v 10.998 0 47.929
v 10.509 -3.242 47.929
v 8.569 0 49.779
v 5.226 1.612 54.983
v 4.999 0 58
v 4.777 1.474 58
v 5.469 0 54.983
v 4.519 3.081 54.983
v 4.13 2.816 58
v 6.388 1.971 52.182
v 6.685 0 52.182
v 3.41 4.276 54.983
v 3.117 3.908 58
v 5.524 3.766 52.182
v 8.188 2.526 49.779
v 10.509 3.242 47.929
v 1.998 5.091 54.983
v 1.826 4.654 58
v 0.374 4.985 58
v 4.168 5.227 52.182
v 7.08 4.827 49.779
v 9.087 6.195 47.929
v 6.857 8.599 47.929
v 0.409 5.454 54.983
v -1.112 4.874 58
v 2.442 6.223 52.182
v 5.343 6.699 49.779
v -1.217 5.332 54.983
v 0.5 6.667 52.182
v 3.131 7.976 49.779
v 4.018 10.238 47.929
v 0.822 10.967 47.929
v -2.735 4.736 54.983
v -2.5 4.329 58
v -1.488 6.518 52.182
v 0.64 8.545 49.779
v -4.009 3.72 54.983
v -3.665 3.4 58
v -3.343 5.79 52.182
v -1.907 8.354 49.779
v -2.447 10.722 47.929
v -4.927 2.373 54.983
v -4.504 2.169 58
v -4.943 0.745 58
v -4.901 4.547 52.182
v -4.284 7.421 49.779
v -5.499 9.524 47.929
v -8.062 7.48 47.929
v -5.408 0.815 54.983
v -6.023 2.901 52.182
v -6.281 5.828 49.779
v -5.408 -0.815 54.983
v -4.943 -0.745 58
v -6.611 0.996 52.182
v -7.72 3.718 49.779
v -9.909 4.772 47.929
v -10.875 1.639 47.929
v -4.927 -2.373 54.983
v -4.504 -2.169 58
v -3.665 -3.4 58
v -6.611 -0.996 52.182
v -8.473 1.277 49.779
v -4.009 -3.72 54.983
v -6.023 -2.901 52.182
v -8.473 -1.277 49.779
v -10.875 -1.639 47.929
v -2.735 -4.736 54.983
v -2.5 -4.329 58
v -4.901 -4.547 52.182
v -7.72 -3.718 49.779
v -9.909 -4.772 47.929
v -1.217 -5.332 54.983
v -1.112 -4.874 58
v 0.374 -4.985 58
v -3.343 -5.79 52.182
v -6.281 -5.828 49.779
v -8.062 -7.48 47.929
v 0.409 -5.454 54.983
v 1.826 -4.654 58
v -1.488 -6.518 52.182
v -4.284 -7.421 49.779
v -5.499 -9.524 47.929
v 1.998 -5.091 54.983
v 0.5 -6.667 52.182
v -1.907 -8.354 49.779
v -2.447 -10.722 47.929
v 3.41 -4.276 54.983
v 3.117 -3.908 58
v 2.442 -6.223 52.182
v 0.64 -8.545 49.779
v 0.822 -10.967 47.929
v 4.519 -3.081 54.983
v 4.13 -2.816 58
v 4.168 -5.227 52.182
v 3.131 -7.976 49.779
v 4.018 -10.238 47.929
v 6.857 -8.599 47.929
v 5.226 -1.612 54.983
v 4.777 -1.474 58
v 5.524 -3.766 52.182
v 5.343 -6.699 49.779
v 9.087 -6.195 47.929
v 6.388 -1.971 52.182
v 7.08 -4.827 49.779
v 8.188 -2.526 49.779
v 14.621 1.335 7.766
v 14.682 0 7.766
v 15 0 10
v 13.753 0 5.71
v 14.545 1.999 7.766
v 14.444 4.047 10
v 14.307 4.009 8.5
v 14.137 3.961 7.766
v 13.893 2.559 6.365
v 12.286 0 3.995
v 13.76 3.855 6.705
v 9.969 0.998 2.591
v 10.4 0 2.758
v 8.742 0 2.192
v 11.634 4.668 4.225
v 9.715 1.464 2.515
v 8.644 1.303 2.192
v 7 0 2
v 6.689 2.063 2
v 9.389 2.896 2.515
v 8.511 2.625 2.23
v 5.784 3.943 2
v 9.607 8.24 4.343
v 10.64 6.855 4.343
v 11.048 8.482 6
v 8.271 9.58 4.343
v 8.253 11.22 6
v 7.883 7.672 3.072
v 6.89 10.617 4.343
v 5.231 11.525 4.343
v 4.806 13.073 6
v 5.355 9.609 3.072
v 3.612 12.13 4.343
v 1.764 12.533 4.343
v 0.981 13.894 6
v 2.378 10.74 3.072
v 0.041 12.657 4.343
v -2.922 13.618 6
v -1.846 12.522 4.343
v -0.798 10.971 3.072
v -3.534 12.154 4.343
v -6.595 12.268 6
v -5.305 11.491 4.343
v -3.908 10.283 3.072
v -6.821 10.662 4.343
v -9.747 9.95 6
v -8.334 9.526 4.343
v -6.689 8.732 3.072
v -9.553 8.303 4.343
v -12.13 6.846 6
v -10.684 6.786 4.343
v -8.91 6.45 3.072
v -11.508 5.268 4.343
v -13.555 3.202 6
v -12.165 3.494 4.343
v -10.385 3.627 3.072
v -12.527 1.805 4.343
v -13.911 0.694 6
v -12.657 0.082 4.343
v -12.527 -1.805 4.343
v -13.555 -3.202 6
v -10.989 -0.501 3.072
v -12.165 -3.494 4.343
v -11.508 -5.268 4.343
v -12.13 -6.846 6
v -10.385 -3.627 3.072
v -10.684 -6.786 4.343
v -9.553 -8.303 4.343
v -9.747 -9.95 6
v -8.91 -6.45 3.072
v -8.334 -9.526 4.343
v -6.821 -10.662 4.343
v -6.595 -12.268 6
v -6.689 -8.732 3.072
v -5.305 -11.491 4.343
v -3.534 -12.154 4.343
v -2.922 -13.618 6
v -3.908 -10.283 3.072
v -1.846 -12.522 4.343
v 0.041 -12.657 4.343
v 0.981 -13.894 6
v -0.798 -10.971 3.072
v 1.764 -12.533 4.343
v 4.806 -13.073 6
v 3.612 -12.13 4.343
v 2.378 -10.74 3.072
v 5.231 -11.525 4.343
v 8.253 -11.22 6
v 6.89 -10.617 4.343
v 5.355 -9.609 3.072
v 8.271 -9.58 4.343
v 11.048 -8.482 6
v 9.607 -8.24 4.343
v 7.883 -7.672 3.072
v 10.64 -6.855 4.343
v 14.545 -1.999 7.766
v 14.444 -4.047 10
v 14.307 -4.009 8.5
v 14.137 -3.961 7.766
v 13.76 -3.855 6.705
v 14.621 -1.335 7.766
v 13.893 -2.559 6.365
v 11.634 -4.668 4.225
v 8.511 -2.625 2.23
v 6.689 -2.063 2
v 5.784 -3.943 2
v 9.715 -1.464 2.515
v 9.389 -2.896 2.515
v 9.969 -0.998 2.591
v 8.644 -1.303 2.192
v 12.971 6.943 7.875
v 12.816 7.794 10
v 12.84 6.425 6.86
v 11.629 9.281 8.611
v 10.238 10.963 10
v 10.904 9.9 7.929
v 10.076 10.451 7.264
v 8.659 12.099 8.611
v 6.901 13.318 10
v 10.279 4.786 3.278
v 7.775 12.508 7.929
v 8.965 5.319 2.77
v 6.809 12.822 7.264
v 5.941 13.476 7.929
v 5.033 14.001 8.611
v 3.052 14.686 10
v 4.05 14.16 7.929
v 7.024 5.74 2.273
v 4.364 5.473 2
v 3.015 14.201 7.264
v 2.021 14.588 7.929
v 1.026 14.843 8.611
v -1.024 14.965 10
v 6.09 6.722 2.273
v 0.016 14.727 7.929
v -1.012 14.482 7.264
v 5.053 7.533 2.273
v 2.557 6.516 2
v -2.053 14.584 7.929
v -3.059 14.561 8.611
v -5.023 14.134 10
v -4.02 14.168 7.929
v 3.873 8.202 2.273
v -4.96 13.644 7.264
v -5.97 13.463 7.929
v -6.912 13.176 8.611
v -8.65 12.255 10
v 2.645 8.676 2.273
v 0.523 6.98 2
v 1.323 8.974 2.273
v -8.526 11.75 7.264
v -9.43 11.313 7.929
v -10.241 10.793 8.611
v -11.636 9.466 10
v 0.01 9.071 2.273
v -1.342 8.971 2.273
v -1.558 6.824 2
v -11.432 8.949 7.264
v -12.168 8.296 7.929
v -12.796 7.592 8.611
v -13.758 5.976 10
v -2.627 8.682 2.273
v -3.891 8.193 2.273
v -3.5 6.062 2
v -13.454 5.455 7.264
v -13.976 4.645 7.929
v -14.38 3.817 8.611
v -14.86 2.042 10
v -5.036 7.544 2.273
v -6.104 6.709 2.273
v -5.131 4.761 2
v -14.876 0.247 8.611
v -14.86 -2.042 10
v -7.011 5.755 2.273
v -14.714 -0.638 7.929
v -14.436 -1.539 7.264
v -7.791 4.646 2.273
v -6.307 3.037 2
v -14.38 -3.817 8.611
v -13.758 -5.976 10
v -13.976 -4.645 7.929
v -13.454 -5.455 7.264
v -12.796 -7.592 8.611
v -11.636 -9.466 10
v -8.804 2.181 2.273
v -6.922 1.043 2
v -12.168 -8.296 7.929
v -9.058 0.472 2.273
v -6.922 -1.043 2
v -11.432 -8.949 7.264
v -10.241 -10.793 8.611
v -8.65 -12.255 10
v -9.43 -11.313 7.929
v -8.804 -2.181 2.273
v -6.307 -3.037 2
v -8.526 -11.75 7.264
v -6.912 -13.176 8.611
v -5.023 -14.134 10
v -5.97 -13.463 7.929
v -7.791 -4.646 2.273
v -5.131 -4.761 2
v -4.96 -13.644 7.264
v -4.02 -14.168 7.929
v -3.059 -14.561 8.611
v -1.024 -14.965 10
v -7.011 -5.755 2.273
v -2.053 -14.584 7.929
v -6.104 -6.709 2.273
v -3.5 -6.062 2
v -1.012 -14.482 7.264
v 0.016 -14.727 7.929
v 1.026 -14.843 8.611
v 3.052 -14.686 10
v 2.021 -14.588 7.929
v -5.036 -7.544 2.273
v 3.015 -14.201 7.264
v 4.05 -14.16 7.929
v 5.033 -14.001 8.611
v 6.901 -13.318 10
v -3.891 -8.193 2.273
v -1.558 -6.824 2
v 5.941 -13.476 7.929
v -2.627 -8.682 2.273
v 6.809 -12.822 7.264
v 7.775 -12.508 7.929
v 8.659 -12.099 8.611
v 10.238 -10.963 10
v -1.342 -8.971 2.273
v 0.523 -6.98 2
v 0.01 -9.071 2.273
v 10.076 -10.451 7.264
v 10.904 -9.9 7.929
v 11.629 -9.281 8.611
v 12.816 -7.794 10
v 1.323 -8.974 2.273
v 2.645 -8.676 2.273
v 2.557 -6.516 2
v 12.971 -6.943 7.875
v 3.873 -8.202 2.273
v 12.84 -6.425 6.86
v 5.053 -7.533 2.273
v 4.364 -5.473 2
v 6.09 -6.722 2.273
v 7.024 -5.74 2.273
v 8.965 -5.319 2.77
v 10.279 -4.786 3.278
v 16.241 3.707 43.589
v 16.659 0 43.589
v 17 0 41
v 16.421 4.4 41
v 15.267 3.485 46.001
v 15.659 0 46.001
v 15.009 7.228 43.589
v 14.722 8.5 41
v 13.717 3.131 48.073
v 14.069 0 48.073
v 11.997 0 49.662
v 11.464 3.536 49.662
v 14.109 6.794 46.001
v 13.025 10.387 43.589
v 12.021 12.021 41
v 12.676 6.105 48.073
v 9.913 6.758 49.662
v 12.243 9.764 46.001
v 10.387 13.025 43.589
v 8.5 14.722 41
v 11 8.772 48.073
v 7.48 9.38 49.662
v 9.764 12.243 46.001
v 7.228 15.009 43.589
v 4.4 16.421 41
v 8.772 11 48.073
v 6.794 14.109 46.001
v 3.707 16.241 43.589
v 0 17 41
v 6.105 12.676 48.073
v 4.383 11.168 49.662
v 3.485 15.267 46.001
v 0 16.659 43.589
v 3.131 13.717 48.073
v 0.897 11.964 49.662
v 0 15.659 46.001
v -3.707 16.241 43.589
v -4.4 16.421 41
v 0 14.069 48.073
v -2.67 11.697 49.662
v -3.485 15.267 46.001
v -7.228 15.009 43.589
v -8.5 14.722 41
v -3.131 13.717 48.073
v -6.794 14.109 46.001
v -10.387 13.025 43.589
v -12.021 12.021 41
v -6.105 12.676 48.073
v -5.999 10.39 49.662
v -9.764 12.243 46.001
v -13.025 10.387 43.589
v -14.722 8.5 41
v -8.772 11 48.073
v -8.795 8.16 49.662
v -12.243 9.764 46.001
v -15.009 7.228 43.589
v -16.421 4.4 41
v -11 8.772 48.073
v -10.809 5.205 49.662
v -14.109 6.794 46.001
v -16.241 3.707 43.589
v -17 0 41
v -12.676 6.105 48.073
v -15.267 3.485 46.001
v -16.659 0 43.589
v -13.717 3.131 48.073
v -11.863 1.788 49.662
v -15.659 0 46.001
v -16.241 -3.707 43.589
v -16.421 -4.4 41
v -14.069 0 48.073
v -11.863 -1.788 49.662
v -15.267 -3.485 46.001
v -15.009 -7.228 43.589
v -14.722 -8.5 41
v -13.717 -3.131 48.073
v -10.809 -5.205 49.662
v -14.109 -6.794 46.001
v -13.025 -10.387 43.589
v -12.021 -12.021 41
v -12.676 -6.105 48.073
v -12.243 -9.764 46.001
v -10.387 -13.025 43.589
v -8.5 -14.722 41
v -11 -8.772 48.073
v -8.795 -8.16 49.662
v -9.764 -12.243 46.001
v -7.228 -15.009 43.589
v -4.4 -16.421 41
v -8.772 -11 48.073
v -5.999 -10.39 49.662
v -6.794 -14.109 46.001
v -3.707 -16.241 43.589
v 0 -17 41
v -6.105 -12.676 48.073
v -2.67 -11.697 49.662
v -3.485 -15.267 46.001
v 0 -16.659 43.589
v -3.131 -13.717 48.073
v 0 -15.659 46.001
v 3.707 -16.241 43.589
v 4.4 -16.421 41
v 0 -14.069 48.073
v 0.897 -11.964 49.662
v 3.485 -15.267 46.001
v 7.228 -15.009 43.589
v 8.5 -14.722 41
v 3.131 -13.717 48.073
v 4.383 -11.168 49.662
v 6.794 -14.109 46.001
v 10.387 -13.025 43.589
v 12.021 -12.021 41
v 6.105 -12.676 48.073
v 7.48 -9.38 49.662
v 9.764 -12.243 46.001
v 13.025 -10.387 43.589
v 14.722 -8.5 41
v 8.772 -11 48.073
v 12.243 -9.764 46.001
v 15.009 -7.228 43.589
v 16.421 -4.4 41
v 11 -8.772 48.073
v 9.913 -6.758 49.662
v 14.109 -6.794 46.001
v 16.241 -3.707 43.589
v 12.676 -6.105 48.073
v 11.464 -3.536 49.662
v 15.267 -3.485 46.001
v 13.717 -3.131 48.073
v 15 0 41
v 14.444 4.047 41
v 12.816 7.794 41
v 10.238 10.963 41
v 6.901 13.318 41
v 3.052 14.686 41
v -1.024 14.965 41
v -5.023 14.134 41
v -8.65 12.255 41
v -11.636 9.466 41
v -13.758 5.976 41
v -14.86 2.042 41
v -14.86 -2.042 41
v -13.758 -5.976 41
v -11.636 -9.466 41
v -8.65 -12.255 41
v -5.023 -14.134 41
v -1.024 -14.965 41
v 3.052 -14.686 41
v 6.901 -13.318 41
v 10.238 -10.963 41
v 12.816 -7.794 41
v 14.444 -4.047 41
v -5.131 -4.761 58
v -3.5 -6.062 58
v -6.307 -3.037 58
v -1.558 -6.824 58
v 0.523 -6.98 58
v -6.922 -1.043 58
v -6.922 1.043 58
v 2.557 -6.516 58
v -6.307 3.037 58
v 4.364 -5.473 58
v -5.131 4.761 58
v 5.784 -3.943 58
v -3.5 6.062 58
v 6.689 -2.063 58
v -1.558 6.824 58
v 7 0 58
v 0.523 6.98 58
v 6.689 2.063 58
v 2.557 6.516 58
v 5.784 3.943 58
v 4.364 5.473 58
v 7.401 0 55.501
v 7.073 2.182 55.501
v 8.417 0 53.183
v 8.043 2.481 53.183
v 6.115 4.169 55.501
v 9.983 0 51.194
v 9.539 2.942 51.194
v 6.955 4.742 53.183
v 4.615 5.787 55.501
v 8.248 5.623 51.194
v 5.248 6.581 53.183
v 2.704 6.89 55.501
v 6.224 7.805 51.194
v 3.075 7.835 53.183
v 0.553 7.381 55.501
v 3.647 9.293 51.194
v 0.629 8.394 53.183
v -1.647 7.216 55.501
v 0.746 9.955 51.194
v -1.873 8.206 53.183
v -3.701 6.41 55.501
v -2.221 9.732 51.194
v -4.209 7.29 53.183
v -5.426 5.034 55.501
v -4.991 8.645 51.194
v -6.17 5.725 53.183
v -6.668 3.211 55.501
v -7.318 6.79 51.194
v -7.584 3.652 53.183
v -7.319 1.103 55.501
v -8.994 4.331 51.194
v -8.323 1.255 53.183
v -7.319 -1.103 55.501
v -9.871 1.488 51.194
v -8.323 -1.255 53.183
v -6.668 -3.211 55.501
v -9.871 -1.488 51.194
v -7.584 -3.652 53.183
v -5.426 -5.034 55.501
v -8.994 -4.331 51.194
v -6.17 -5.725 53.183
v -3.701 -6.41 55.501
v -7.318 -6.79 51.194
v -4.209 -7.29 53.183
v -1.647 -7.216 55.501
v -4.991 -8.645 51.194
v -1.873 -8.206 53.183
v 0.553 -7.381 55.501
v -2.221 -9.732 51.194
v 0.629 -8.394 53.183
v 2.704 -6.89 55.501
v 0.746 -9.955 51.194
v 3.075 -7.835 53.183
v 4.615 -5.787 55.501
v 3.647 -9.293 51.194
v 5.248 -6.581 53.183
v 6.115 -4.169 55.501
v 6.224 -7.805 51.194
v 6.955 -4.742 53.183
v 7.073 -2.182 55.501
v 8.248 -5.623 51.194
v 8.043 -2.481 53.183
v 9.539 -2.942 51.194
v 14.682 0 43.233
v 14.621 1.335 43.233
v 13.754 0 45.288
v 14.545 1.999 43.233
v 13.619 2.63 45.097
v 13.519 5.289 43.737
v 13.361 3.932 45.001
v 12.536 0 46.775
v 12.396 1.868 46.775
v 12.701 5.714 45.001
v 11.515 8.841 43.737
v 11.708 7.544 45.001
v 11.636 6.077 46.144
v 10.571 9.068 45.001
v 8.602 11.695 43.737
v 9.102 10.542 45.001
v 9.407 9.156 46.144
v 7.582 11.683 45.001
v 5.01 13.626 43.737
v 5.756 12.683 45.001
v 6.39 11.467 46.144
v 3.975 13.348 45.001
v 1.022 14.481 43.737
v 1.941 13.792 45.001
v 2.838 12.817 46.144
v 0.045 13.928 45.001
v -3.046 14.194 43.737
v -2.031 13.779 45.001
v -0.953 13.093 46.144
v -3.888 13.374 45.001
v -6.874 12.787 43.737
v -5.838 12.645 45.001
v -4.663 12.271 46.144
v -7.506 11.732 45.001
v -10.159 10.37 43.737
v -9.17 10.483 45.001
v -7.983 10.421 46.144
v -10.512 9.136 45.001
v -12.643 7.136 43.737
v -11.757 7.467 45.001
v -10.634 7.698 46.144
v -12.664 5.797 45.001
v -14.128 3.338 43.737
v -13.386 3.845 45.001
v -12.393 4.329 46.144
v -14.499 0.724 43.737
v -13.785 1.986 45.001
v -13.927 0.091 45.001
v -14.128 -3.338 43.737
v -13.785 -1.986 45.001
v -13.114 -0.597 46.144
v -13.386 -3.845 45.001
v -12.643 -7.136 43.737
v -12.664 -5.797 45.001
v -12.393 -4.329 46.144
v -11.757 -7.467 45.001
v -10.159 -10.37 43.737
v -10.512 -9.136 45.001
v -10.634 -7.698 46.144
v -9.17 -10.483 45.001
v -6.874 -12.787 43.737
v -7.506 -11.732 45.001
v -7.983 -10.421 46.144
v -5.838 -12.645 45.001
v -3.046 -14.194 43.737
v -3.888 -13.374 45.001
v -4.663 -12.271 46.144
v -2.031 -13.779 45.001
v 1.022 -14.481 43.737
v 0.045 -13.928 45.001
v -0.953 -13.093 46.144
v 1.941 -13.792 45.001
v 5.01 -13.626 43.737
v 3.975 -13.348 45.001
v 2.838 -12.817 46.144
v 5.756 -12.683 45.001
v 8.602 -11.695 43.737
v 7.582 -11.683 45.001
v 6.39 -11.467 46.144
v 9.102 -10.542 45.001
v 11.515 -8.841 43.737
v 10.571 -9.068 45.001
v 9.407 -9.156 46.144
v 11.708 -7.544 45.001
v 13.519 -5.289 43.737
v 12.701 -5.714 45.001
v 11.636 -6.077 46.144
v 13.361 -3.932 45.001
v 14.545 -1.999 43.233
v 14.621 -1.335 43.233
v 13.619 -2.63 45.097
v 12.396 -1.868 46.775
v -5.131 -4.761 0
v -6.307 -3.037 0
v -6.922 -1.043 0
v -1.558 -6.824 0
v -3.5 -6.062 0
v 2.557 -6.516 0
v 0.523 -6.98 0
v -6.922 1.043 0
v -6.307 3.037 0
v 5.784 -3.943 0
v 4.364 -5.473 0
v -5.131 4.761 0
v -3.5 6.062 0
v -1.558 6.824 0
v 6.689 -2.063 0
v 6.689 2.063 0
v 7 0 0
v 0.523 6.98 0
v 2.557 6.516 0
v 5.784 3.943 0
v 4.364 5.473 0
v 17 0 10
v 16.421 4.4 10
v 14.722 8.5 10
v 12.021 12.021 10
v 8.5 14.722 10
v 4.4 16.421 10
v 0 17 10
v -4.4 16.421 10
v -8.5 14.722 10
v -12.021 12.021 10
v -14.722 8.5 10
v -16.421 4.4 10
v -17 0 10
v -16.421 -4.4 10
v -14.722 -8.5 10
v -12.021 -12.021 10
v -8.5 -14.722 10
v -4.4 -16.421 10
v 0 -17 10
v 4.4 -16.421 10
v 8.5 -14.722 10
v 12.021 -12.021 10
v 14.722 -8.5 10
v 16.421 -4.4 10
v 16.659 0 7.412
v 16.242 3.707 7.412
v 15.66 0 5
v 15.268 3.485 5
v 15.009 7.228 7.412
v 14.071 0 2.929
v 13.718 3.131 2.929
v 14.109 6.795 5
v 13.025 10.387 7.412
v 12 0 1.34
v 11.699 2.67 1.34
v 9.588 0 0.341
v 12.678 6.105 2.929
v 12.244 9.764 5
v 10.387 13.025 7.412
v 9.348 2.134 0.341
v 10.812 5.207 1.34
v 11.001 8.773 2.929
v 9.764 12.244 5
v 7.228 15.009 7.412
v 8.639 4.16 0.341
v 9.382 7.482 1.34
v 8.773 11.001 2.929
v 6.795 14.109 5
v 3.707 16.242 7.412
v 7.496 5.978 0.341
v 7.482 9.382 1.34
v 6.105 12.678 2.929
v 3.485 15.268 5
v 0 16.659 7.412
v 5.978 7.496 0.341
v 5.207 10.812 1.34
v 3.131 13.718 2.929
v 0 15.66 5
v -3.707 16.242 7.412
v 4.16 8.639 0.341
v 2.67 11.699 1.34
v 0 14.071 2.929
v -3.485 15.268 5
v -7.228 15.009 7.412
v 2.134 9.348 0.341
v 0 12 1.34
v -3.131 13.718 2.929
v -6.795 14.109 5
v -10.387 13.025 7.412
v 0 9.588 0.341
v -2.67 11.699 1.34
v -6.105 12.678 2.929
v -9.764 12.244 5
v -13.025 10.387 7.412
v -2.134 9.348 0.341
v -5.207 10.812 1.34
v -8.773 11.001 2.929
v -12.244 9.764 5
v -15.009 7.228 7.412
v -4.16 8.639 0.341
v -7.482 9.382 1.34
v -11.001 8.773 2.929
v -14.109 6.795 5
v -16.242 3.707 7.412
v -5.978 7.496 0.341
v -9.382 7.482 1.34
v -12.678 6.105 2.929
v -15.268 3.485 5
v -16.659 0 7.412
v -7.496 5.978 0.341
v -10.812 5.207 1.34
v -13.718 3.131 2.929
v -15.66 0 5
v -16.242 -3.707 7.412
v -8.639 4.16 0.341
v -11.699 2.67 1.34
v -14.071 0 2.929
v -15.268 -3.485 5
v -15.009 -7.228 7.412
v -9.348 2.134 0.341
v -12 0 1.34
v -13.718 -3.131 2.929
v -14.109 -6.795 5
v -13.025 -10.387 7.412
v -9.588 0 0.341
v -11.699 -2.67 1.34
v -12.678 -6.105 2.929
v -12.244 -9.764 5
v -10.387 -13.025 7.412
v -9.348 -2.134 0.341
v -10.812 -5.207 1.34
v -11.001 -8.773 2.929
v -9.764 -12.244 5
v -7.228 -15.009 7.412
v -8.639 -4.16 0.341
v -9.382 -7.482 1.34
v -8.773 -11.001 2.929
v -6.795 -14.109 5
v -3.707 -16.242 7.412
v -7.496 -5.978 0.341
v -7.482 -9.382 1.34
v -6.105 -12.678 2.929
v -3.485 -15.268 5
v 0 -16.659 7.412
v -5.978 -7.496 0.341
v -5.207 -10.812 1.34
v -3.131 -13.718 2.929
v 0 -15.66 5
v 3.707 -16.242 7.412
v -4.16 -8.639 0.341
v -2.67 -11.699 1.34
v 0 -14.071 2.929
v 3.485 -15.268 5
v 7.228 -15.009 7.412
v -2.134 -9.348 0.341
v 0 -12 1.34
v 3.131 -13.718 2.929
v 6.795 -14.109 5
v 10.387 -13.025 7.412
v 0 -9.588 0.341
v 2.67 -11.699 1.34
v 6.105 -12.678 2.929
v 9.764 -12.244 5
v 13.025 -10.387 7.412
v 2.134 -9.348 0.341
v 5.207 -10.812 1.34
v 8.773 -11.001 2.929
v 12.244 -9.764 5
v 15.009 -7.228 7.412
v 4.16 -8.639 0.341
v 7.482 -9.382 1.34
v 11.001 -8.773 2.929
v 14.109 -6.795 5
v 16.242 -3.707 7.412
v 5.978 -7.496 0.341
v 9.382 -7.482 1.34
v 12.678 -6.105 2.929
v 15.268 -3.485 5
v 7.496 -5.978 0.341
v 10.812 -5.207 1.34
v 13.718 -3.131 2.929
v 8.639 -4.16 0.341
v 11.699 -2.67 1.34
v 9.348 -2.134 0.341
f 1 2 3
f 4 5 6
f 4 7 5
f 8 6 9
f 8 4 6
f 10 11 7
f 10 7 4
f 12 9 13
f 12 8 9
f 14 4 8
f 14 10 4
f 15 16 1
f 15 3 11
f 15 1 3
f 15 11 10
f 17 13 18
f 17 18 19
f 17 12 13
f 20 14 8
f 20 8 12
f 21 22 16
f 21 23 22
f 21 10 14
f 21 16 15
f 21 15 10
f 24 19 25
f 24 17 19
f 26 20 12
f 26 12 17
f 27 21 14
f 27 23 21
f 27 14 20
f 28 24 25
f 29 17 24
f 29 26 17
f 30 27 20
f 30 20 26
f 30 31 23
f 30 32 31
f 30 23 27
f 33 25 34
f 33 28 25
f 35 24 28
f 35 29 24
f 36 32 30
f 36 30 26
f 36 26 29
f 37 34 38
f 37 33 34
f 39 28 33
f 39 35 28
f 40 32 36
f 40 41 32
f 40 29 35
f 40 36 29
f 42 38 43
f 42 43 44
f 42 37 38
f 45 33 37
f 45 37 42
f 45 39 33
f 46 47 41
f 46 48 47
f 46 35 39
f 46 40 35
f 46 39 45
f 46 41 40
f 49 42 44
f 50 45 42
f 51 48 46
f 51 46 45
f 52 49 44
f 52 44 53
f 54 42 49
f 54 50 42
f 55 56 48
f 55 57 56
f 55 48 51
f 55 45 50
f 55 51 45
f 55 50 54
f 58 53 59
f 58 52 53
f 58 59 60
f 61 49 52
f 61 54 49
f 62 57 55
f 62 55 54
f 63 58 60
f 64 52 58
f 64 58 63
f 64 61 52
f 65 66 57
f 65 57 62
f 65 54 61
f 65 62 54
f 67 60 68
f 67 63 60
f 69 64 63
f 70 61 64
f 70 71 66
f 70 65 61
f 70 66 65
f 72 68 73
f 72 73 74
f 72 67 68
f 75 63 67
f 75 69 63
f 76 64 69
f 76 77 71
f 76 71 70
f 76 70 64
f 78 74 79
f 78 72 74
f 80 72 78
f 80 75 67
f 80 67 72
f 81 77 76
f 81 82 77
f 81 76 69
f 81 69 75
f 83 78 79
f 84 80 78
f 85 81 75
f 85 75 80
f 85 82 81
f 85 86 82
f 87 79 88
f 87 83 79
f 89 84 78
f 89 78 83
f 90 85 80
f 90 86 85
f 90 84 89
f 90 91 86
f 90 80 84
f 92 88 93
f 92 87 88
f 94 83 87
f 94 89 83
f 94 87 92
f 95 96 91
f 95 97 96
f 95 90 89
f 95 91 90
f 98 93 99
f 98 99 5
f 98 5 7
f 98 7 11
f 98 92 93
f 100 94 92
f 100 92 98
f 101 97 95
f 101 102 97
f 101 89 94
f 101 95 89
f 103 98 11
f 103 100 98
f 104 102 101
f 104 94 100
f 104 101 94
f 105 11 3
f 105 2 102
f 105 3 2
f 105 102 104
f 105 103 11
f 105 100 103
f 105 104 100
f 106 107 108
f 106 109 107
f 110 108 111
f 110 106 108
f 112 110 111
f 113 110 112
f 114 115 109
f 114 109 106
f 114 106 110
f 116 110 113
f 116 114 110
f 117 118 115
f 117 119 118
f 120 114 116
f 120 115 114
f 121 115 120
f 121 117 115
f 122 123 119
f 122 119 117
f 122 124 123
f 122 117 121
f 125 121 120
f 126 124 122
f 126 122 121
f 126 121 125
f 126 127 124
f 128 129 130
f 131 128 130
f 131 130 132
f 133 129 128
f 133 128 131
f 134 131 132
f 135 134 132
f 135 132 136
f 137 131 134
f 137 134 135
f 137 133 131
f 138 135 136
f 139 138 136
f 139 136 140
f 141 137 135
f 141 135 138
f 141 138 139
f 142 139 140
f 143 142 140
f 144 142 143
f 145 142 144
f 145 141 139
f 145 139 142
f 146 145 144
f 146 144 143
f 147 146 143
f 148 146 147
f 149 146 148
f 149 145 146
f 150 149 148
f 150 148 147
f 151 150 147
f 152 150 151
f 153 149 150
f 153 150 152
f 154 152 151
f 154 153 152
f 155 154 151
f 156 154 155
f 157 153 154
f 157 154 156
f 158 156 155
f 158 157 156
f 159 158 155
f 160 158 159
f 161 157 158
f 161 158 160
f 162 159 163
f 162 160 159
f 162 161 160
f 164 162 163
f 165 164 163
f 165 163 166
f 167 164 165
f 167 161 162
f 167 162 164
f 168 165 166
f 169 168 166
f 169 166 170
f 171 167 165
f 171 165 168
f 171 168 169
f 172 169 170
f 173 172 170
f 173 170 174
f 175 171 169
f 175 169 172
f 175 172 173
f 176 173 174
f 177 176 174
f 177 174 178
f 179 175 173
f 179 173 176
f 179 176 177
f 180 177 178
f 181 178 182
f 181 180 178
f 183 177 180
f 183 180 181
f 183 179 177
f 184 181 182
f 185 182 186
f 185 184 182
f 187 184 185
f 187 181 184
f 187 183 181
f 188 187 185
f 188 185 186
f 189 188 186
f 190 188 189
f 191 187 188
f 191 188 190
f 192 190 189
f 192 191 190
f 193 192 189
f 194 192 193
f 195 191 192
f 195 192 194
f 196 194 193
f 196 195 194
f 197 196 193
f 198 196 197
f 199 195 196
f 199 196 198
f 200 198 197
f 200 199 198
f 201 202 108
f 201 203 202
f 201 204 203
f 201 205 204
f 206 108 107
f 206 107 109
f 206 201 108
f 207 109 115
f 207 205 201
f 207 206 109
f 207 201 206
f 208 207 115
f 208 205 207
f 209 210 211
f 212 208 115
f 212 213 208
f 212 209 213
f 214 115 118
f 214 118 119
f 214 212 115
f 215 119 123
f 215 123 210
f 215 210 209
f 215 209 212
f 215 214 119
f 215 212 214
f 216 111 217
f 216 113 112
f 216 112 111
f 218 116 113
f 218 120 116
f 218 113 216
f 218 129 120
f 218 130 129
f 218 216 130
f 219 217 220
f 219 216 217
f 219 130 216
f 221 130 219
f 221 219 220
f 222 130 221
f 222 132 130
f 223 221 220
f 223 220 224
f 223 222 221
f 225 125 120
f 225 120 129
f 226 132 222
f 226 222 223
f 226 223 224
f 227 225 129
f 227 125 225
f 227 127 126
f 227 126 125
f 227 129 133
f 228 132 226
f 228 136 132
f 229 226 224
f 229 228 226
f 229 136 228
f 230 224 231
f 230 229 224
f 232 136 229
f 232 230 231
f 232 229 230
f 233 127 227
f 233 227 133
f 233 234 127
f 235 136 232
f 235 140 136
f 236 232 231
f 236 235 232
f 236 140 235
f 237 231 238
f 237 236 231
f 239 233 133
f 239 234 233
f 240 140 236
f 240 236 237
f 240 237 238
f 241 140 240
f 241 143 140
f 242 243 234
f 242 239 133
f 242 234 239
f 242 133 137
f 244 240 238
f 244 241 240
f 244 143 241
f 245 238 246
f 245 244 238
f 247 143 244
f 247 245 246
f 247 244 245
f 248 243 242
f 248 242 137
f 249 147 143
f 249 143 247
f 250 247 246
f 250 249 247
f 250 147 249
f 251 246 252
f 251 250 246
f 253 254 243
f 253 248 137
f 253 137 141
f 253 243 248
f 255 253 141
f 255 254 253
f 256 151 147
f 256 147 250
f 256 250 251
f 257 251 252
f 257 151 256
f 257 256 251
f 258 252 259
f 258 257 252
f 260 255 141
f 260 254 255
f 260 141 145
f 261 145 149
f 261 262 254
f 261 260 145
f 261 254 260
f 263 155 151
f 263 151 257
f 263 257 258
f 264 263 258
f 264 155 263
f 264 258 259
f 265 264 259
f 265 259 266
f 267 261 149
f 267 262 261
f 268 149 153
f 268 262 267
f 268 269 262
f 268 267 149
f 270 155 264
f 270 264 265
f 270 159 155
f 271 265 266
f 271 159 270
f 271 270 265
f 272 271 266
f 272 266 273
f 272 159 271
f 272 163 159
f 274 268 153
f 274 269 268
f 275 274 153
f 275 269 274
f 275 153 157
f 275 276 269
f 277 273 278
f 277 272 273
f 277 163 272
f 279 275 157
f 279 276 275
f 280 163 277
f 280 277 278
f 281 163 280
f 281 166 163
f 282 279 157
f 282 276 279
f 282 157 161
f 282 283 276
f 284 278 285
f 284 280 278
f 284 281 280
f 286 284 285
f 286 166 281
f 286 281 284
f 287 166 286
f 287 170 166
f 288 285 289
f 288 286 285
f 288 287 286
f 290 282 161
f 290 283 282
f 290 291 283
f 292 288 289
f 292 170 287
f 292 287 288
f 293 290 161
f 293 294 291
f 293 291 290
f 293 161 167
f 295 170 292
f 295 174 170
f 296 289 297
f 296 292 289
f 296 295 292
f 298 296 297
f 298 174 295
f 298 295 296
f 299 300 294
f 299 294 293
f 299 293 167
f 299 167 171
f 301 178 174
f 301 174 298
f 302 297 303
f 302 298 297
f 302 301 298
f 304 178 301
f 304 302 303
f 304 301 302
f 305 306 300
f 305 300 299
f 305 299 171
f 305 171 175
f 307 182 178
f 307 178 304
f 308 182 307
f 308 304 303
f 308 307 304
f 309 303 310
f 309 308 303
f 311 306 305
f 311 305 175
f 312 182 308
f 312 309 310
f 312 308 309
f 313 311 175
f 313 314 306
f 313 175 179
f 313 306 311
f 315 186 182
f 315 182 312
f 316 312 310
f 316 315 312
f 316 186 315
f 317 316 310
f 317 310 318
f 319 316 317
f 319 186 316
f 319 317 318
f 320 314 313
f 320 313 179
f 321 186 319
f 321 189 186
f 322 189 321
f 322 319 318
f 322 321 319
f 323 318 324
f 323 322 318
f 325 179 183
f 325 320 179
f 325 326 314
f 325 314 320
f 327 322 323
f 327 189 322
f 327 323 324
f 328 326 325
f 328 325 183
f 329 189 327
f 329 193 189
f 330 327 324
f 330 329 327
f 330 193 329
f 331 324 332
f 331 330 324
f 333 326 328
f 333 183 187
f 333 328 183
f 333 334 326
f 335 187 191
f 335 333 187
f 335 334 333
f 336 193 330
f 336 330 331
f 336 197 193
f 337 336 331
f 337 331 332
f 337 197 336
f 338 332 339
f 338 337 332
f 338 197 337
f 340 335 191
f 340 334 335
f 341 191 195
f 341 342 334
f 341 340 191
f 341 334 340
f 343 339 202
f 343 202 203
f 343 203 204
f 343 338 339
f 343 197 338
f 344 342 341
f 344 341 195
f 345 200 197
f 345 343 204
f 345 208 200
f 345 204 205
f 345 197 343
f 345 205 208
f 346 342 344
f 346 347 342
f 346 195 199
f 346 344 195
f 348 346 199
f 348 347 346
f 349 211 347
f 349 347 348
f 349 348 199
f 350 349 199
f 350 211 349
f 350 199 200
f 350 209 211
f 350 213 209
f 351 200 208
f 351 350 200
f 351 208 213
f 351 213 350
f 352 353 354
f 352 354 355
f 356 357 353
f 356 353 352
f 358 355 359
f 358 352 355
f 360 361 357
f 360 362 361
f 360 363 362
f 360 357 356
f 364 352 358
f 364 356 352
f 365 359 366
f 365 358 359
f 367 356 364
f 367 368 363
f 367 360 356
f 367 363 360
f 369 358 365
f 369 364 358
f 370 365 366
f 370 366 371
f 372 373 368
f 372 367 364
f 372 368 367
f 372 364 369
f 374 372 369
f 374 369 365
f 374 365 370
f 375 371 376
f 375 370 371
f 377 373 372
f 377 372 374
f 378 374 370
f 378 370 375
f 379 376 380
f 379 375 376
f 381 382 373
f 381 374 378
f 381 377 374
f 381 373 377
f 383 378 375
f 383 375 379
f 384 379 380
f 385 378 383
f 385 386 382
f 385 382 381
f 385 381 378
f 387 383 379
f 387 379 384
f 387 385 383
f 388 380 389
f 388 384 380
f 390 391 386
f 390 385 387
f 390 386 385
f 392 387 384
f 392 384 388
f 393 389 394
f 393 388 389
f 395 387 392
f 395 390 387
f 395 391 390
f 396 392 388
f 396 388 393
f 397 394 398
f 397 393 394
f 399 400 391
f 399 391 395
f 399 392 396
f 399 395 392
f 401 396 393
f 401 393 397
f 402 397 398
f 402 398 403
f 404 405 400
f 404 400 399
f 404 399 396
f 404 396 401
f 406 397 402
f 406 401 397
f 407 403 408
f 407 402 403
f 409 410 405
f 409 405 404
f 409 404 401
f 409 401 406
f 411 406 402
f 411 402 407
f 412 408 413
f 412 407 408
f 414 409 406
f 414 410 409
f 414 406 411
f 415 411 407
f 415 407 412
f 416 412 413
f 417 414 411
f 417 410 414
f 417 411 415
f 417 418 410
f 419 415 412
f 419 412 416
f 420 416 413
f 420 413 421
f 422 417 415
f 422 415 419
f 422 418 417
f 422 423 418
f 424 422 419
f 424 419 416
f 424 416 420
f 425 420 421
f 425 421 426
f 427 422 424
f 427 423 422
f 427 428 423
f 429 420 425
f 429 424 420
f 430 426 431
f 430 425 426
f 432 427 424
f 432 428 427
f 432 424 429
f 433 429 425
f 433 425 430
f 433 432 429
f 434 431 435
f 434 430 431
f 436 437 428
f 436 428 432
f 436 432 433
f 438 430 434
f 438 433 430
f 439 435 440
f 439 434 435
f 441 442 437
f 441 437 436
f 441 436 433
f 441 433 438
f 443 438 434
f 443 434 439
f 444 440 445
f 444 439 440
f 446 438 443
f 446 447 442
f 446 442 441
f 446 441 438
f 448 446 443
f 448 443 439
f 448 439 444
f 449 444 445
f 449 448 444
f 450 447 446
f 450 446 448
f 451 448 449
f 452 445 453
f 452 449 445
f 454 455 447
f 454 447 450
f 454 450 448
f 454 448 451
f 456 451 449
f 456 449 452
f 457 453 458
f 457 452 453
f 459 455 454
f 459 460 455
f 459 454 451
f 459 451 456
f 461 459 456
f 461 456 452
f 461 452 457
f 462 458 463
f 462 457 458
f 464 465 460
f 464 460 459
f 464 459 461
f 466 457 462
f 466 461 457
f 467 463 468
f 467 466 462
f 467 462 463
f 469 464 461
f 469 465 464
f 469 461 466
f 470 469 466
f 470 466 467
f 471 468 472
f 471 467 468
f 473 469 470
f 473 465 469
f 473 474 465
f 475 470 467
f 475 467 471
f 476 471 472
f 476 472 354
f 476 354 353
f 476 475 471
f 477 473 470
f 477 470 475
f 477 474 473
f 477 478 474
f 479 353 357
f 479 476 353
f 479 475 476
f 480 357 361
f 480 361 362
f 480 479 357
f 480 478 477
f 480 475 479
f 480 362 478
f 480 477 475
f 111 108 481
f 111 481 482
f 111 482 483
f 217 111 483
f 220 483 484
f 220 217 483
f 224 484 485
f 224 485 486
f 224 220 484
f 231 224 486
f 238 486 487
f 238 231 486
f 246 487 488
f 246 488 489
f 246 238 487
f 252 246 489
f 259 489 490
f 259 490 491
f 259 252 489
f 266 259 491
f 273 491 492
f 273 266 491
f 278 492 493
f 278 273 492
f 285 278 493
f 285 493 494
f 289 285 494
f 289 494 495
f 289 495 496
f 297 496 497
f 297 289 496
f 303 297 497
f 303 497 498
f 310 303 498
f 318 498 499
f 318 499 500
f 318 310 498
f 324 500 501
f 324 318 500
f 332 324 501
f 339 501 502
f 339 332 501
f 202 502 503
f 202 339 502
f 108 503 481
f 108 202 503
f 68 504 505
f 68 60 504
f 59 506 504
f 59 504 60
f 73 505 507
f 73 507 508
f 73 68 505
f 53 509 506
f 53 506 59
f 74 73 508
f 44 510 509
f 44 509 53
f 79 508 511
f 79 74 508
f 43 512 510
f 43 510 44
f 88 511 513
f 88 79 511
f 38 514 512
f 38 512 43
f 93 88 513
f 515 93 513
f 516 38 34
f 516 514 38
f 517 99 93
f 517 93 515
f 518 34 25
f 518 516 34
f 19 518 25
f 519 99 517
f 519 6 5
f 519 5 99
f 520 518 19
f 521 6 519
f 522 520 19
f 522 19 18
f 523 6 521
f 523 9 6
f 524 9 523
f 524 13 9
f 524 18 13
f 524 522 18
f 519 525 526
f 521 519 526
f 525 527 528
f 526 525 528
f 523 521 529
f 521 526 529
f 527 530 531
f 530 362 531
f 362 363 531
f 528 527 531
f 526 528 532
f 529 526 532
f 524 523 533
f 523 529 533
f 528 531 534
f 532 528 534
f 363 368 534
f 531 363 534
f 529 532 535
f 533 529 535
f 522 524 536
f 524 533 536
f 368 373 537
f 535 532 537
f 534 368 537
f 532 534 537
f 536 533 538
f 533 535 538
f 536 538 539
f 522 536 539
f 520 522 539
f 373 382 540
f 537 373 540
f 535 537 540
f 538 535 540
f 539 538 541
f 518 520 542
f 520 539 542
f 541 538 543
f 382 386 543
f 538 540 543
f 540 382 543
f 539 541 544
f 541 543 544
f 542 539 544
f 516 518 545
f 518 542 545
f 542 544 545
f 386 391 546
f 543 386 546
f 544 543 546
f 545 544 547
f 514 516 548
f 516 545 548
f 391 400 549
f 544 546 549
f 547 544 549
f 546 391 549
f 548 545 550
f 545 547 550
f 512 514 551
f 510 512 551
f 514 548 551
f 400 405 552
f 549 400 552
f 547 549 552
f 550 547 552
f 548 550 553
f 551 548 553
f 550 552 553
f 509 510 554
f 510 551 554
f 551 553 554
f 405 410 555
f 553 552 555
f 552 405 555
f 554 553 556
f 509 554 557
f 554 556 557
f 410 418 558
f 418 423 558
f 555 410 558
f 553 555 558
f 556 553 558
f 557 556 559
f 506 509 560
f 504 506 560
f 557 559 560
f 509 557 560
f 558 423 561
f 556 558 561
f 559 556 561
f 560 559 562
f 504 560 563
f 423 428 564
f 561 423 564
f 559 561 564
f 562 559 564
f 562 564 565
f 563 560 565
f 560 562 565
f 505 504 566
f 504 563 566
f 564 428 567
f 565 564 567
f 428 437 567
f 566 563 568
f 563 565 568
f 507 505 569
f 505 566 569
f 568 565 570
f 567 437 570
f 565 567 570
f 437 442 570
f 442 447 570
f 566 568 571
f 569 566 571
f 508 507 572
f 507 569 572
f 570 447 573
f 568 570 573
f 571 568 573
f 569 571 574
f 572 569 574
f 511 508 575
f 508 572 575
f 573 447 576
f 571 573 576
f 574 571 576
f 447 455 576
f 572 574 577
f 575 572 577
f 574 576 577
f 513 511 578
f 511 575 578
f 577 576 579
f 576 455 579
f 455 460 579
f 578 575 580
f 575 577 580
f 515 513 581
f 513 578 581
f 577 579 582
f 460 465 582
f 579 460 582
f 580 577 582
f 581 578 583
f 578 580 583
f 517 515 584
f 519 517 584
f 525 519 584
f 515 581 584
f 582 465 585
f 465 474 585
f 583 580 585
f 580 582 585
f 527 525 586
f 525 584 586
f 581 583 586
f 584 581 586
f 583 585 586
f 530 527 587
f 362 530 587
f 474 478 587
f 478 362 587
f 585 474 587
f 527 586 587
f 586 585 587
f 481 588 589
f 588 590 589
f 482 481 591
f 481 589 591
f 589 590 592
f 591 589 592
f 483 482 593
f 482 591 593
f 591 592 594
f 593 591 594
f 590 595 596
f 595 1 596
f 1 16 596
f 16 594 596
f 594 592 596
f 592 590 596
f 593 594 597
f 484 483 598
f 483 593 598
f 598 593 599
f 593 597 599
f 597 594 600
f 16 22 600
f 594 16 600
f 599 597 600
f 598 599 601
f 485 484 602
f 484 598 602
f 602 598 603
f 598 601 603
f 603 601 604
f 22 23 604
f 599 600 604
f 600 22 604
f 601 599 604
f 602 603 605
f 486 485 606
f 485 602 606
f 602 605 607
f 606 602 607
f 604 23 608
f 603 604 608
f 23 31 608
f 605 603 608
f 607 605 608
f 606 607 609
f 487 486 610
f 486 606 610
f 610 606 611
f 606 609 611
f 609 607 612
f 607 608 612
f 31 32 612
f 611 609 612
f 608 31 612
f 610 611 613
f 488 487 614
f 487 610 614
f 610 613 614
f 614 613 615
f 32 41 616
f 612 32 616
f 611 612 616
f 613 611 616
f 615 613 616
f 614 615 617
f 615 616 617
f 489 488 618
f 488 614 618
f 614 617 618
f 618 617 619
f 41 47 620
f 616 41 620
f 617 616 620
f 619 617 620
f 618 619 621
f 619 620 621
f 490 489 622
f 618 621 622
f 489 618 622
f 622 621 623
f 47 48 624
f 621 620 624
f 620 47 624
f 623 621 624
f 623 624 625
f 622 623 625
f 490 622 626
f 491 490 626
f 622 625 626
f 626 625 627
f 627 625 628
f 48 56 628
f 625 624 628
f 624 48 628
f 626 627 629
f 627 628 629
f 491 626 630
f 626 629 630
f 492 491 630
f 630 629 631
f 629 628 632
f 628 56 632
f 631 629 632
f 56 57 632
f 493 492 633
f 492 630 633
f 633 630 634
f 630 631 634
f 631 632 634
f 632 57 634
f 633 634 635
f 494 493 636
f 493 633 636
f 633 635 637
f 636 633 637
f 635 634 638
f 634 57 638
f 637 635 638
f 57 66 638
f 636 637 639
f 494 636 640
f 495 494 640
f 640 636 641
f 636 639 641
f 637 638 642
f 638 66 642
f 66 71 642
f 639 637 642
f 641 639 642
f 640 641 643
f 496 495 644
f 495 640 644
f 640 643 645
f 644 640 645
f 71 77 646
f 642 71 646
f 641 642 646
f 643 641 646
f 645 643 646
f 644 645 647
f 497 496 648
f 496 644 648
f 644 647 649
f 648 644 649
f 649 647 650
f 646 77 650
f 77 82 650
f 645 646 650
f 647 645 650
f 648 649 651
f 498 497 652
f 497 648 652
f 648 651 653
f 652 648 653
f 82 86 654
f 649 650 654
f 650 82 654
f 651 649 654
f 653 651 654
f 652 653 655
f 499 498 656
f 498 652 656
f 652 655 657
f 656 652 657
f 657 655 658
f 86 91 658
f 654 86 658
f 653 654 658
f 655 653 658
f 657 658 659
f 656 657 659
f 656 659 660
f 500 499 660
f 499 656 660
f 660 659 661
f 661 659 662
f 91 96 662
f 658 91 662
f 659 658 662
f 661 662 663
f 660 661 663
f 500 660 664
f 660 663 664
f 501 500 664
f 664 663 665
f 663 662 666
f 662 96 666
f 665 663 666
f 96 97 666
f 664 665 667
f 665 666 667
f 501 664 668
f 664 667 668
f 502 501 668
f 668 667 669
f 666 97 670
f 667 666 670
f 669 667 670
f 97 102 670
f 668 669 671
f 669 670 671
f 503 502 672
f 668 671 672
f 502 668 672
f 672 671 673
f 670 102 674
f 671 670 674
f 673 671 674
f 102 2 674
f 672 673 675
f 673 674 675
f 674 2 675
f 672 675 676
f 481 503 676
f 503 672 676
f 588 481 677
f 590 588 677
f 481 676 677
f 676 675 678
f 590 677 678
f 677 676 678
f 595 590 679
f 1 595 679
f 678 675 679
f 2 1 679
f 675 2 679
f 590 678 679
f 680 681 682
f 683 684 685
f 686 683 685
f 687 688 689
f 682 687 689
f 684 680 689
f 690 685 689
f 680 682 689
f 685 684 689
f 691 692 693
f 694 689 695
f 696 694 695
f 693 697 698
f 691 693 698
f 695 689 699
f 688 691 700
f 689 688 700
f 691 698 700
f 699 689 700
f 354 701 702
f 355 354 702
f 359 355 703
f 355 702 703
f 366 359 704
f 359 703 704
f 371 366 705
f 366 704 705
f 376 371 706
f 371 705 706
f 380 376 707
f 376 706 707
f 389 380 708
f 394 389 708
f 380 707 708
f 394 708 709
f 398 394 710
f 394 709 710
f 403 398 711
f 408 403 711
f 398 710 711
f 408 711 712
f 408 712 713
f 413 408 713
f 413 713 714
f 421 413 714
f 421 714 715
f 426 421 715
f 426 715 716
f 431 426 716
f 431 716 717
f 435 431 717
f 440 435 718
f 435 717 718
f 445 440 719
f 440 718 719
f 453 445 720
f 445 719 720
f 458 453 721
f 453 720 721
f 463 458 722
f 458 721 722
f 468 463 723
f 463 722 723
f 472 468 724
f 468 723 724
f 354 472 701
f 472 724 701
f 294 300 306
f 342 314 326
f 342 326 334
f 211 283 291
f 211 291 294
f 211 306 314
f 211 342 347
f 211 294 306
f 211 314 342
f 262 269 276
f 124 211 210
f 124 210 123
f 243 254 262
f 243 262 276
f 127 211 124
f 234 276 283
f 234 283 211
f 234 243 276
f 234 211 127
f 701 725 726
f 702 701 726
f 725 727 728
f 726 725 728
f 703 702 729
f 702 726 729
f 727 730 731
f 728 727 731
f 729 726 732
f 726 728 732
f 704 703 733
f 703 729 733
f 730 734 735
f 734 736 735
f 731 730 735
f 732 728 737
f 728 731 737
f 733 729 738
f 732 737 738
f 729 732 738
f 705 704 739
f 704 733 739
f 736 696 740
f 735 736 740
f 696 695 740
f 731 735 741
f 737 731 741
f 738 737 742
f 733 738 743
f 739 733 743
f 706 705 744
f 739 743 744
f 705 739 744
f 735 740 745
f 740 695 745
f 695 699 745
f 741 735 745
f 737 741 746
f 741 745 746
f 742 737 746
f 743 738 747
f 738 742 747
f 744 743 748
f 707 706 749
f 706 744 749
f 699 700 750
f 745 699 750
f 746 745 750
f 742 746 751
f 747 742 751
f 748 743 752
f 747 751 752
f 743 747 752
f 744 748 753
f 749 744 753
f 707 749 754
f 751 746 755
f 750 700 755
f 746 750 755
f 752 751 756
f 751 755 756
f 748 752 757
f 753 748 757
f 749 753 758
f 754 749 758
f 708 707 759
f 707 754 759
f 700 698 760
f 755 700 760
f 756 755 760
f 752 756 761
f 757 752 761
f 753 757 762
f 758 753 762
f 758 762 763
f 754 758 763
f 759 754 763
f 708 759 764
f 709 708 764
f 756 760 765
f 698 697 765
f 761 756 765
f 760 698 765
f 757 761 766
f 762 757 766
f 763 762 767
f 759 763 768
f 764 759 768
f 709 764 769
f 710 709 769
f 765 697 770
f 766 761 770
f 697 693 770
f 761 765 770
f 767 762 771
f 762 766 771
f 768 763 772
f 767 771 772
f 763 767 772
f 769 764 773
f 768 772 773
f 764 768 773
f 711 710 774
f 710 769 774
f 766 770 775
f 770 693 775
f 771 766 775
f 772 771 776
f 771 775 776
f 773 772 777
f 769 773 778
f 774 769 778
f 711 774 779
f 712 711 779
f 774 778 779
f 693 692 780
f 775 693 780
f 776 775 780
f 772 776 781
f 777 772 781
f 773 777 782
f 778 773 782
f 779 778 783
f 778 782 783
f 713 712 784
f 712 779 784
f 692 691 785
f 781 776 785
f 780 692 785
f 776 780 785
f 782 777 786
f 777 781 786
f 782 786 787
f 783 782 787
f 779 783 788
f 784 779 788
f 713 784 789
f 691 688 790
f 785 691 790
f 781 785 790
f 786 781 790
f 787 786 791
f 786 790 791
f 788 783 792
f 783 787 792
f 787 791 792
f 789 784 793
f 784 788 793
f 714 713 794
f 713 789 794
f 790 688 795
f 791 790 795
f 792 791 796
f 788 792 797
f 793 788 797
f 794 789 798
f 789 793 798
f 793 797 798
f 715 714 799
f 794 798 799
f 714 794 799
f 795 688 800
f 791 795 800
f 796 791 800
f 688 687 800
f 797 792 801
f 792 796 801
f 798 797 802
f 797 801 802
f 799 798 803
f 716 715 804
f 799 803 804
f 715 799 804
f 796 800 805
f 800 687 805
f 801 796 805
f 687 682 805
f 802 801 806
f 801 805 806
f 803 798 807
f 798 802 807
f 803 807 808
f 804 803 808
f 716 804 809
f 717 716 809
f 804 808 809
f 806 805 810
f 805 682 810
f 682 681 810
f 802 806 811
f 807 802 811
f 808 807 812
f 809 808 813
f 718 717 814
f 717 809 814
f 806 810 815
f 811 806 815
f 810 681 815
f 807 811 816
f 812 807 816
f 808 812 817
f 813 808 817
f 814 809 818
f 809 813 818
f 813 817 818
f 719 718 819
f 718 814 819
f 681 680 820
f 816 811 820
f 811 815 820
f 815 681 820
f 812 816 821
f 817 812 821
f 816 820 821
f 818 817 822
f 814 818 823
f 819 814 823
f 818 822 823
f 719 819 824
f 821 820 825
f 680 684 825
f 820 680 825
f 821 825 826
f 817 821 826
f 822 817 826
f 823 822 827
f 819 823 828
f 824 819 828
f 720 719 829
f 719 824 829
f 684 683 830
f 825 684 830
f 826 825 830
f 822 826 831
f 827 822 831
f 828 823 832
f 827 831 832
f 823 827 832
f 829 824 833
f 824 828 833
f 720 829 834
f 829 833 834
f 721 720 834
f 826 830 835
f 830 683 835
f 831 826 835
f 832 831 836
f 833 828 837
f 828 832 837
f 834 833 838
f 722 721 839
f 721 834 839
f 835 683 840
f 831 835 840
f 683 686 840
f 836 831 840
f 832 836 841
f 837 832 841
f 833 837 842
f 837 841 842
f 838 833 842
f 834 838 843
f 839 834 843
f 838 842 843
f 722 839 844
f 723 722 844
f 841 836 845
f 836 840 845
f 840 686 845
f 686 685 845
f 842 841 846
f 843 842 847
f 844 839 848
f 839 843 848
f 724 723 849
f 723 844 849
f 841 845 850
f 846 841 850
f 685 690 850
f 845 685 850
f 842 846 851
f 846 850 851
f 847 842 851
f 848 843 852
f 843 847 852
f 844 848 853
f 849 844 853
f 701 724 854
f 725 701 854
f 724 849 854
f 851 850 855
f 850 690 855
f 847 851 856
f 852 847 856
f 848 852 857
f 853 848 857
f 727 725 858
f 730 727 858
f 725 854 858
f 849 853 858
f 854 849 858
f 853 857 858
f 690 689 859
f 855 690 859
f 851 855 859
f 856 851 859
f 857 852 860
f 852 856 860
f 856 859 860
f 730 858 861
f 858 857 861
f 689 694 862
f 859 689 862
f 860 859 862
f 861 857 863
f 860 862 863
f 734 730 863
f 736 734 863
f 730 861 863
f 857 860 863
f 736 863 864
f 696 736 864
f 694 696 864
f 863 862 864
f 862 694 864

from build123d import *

# Parameters (mm, degrees)
SKETCH1_R           = 17
BOSS_EXTRUDE1_DEPTH = 51
FILLET1_R           = 10
FILLET2_R           = 10
SKETCH2_R           = 7
BOSS_EXTRUDE2_DEPTH = 7
FILLET3_R           = 10
SHELL1_T            = -2


with BuildPart() as part:
    # Sketch1 → Boss-Extrude1 (new body)
    with BuildSketch(Plane.XY):
        Circle(SKETCH1_R)
    extrude(amount=BOSS_EXTRUDE1_DEPTH)

    # Fillet1
    fillet1_edges = [part.edges().sort_by_distance(p)[0] for p in [
        (-17, 0, 0),
    ]]
    fillet(fillet1_edges, radius=FILLET1_R)

    # Fillet2
    fillet2_edges = [part.edges().sort_by_distance(p)[0] for p in [
        (-17, 0, 51),
    ]]
    fillet(fillet2_edges, radius=FILLET2_R)

    # Sketch2 → Boss-Extrude2 (add)
    with BuildSketch(Plane.XY.offset(51)):
        Circle(SKETCH2_R)
    extrude(amount=BOSS_EXTRUDE2_DEPTH)

    # Fillet3
    # the kernel refuses this fillet: 10 mm, written as the material it adds along each edge
    with BuildSketch(Plane(origin=(0, 0, 51), x_dir=(1, 0, 0), z_dir=(0, -1, 0))) as fillet3_piece_1:
        with BuildLine():
            CenterArc((16.994765066, 7.323529412), FILLET3_R, 181.854010516, 58.163304996)
            Line((7, 7), (6.800104699, 6.993529412))
            ThreePointArc((6.800104699, 6.993529412), (6.8, 3.5), (6.8, 0))
            Line((6.8, 0), (7, -0.2))
            ThreePointArc((7, -0.2), (9.534996229, -0.53354374), (11.897434882, -1.511470588))
            Line((11.897434882, -1.511470588), (11.997382533, -1.338235294))
        make_face()
    revolve(axis=Axis((0, 0, 51), (0, 0, 1)))

    # Shell1
    shell1_openings = [part.faces().sort_by_distance(p)[0] for p in [
        (0, 0, 58),
    ]]
    offset(amount=SHELL1_T, openings=shell1_openings, kind=Kind.INTERSECTION)


solid = part.part
